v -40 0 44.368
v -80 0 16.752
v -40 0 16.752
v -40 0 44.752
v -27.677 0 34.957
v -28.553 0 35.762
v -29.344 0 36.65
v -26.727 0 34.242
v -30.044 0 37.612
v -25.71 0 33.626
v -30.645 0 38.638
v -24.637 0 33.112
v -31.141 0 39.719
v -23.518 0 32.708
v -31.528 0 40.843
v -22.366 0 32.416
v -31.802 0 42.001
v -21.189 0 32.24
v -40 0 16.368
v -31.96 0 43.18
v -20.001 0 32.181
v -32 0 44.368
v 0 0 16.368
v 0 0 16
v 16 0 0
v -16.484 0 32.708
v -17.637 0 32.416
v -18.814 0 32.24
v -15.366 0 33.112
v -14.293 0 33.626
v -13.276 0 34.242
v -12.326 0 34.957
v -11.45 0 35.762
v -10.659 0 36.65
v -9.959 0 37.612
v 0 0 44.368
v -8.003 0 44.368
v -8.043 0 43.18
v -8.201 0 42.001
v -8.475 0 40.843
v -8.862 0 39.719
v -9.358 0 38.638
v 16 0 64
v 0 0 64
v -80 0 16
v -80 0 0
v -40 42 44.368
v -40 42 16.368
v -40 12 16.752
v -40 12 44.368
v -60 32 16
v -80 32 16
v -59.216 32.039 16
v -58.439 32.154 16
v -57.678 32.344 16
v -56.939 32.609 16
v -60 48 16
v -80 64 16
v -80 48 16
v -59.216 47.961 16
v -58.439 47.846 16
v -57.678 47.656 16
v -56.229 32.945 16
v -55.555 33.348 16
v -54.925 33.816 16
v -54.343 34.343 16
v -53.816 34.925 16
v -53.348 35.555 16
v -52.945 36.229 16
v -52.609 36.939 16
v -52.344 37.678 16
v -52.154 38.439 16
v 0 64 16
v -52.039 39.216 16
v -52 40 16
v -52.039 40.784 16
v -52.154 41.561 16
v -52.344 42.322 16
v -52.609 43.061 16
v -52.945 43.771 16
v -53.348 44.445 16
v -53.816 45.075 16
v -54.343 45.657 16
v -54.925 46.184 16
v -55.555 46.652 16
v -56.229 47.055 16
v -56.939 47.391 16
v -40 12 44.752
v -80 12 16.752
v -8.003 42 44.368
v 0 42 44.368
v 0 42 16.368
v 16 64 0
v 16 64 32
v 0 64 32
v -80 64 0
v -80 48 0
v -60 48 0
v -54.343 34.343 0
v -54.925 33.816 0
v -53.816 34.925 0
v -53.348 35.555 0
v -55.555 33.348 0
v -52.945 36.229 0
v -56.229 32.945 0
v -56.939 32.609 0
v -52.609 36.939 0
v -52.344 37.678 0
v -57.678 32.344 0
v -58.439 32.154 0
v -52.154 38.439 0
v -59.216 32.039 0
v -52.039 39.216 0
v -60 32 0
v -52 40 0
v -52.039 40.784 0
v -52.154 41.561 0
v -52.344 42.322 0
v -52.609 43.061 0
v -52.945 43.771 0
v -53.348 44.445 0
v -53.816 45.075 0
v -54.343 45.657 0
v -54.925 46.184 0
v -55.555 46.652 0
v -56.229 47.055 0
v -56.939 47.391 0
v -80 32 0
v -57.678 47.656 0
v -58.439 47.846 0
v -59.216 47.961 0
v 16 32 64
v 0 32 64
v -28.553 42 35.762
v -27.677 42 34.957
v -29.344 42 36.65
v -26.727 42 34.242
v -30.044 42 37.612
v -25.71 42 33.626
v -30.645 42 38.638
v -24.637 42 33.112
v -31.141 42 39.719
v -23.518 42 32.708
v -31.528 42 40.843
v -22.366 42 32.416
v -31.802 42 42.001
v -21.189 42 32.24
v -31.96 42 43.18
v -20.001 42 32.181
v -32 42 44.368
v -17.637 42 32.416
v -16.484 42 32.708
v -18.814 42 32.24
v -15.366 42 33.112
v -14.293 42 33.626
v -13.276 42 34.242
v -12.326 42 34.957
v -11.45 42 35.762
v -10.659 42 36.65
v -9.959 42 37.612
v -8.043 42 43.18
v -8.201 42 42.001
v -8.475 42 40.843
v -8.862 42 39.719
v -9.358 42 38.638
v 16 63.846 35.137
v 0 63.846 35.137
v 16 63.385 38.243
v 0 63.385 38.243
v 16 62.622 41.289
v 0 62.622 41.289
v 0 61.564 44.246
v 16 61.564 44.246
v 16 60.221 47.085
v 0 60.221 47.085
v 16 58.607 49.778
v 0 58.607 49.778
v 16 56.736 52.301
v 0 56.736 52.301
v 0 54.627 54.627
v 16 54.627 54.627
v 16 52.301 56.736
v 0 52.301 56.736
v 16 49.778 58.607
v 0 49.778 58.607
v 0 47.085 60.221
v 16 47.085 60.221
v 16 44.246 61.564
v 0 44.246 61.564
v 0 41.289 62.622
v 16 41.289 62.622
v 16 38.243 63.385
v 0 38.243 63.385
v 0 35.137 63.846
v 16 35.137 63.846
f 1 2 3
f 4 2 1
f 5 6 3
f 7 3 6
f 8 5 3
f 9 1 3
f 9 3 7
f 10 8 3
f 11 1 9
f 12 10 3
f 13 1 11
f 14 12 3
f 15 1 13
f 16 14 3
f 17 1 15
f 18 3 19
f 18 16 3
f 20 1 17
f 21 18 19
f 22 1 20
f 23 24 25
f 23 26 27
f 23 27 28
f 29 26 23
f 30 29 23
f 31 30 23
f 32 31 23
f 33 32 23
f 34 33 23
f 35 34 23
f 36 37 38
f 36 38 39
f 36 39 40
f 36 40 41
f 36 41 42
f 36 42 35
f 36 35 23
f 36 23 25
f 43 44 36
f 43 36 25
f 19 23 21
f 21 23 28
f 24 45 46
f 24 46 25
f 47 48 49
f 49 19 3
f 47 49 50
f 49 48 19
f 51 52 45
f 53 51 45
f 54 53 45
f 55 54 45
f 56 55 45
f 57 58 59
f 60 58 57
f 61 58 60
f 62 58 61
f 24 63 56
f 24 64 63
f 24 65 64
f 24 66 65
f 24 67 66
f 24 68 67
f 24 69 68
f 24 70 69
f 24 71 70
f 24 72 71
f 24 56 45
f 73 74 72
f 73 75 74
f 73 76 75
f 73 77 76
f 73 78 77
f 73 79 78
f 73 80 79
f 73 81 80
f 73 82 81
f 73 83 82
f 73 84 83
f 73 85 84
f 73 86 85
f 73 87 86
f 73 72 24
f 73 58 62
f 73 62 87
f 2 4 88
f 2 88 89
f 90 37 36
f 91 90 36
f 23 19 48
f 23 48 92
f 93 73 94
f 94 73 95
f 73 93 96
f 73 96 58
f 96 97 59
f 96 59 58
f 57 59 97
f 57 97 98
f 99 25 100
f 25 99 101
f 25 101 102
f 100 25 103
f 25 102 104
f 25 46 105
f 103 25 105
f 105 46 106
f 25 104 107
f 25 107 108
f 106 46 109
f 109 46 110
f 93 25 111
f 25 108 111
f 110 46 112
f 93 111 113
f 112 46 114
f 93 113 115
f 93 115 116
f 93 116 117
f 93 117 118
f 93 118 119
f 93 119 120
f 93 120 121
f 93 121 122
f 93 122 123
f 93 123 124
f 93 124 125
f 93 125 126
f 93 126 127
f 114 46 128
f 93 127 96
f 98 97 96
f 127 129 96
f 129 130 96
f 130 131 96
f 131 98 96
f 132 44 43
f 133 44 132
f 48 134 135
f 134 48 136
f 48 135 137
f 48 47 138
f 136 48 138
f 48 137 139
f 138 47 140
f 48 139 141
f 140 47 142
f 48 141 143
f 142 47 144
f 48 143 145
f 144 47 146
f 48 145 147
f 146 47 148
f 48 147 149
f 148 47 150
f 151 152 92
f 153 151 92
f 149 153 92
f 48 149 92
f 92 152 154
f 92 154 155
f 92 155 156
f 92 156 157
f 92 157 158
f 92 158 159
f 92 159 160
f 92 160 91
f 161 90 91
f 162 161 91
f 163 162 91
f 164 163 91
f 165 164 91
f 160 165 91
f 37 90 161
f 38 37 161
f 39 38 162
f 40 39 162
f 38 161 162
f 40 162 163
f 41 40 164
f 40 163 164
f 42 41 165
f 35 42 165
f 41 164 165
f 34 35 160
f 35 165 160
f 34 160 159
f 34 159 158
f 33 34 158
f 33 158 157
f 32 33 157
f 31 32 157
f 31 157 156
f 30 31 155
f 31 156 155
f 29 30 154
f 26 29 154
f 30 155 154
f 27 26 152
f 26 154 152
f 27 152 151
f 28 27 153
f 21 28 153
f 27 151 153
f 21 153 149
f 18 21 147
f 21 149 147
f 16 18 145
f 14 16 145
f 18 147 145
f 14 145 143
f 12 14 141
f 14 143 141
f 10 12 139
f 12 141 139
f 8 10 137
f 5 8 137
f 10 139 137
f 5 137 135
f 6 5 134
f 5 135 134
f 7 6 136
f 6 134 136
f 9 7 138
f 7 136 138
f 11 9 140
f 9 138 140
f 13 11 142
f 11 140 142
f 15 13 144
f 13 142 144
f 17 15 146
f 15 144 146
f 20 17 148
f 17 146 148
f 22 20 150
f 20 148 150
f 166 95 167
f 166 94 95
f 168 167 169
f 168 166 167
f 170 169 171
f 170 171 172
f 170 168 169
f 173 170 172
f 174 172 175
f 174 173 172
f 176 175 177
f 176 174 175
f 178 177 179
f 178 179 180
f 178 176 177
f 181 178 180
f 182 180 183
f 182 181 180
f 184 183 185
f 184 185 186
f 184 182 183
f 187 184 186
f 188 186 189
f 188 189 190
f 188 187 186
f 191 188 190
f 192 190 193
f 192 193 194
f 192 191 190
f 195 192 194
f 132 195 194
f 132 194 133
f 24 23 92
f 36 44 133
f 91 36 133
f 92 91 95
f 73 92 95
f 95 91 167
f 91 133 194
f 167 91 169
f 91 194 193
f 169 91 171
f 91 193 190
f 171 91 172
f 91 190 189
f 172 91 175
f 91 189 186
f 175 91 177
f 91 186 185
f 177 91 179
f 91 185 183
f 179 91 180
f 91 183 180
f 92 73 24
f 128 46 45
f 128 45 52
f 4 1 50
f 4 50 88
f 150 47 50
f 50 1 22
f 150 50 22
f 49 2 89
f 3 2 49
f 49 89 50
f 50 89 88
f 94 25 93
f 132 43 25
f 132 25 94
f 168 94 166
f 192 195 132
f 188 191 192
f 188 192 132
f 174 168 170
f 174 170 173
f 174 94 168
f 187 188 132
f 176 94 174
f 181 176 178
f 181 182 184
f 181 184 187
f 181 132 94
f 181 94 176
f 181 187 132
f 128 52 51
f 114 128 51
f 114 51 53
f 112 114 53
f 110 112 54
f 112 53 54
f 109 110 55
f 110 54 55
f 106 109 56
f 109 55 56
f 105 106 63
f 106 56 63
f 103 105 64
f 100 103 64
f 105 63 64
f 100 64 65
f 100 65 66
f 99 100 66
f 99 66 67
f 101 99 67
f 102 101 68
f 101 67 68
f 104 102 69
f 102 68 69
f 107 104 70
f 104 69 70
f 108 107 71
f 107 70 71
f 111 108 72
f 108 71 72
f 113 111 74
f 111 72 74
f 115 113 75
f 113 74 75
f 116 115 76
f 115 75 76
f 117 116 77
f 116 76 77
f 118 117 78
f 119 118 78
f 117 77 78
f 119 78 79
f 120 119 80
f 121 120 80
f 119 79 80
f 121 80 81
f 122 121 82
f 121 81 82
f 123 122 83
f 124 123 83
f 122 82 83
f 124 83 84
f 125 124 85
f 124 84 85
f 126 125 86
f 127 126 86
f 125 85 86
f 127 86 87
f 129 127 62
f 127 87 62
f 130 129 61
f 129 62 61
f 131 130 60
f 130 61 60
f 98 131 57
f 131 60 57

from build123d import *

# Parameters (mm, degrees)
F0_W      = 80
F0_H      = 64
F1_DEPTH  = 16
F2_W      = 64
F2_H      = 64
F3_DEPTH  = 16
F4_R      = 32
F5_W      = 40
F5_H      = 28
F6_DEPTH  = 42
F8_DEPTH  = 42
F10_DEPTH = 12
F11_W     = 20
F11_H     = 16
F12_DEPTH = 16


with BuildPart() as f1:
    # F0 (on Top) → F1 (new body)
    with BuildSketch(Plane.XY):
        with Locations((-40, 32)):
            Rectangle(F0_W, F0_H)
    extrude(amount=F1_DEPTH)

    # F2 (on Right) → F3 (join)
    with BuildSketch(Plane.YZ):
        with Locations((32, 32)):
            Rectangle(F2_W, F2_H)
    extrude(amount=F3_DEPTH)

    # F4
    f4_edges = [f1.edges().sort_by_distance(p)[0] for p in [
        (8, 64, 64),
    ]]
    fillet(f4_edges, radius=F4_R)

    # F5 (on Front) → F6 (join)
    with BuildSketch(Plane.XZ):
        with Locations((-20, 30.368277)):
            Rectangle(F5_W, F5_H)
    extrude(amount=-F6_DEPTH)

    # F7 (on face) → F8 (cut)
    with BuildSketch(Plane(origin=(0, 42, 0), x_dir=(-1, 0, 0), z_dir=(0, 1, 0))):
        with BuildLine():
            Line((32, 44.368277), (8.002928, 44.368277))
            ThreePointArc((8.002928, 44.368277), (20.001464, 32.180844), (32, 44.368277))
        make_face()
    extrude(amount=-F8_DEPTH, mode=Mode.SUBTRACT)

    # F9 (on Front) → F10 (join)
    with BuildSketch(Plane.XZ):
        Polygon((-40, 16.752034), (-40, 44.752034), (-80, 16.752034), align=None)
    extrude(amount=-F10_DEPTH)

    # F11 (on face) → F12 (cut)
    with BuildSketch(Plane.XY.offset(16)):
        with Locations((-70, 40)):
            Rectangle(F11_W, F11_H)
        with BuildLine():
            Line((-60, 48), (-60, 32))
            ThreePointArc((-60, 32), (-52, 40), (-60, 48))
        make_face()
    extrude(amount=-F12_DEPTH, mode=Mode.SUBTRACT)


solid = f1.part
